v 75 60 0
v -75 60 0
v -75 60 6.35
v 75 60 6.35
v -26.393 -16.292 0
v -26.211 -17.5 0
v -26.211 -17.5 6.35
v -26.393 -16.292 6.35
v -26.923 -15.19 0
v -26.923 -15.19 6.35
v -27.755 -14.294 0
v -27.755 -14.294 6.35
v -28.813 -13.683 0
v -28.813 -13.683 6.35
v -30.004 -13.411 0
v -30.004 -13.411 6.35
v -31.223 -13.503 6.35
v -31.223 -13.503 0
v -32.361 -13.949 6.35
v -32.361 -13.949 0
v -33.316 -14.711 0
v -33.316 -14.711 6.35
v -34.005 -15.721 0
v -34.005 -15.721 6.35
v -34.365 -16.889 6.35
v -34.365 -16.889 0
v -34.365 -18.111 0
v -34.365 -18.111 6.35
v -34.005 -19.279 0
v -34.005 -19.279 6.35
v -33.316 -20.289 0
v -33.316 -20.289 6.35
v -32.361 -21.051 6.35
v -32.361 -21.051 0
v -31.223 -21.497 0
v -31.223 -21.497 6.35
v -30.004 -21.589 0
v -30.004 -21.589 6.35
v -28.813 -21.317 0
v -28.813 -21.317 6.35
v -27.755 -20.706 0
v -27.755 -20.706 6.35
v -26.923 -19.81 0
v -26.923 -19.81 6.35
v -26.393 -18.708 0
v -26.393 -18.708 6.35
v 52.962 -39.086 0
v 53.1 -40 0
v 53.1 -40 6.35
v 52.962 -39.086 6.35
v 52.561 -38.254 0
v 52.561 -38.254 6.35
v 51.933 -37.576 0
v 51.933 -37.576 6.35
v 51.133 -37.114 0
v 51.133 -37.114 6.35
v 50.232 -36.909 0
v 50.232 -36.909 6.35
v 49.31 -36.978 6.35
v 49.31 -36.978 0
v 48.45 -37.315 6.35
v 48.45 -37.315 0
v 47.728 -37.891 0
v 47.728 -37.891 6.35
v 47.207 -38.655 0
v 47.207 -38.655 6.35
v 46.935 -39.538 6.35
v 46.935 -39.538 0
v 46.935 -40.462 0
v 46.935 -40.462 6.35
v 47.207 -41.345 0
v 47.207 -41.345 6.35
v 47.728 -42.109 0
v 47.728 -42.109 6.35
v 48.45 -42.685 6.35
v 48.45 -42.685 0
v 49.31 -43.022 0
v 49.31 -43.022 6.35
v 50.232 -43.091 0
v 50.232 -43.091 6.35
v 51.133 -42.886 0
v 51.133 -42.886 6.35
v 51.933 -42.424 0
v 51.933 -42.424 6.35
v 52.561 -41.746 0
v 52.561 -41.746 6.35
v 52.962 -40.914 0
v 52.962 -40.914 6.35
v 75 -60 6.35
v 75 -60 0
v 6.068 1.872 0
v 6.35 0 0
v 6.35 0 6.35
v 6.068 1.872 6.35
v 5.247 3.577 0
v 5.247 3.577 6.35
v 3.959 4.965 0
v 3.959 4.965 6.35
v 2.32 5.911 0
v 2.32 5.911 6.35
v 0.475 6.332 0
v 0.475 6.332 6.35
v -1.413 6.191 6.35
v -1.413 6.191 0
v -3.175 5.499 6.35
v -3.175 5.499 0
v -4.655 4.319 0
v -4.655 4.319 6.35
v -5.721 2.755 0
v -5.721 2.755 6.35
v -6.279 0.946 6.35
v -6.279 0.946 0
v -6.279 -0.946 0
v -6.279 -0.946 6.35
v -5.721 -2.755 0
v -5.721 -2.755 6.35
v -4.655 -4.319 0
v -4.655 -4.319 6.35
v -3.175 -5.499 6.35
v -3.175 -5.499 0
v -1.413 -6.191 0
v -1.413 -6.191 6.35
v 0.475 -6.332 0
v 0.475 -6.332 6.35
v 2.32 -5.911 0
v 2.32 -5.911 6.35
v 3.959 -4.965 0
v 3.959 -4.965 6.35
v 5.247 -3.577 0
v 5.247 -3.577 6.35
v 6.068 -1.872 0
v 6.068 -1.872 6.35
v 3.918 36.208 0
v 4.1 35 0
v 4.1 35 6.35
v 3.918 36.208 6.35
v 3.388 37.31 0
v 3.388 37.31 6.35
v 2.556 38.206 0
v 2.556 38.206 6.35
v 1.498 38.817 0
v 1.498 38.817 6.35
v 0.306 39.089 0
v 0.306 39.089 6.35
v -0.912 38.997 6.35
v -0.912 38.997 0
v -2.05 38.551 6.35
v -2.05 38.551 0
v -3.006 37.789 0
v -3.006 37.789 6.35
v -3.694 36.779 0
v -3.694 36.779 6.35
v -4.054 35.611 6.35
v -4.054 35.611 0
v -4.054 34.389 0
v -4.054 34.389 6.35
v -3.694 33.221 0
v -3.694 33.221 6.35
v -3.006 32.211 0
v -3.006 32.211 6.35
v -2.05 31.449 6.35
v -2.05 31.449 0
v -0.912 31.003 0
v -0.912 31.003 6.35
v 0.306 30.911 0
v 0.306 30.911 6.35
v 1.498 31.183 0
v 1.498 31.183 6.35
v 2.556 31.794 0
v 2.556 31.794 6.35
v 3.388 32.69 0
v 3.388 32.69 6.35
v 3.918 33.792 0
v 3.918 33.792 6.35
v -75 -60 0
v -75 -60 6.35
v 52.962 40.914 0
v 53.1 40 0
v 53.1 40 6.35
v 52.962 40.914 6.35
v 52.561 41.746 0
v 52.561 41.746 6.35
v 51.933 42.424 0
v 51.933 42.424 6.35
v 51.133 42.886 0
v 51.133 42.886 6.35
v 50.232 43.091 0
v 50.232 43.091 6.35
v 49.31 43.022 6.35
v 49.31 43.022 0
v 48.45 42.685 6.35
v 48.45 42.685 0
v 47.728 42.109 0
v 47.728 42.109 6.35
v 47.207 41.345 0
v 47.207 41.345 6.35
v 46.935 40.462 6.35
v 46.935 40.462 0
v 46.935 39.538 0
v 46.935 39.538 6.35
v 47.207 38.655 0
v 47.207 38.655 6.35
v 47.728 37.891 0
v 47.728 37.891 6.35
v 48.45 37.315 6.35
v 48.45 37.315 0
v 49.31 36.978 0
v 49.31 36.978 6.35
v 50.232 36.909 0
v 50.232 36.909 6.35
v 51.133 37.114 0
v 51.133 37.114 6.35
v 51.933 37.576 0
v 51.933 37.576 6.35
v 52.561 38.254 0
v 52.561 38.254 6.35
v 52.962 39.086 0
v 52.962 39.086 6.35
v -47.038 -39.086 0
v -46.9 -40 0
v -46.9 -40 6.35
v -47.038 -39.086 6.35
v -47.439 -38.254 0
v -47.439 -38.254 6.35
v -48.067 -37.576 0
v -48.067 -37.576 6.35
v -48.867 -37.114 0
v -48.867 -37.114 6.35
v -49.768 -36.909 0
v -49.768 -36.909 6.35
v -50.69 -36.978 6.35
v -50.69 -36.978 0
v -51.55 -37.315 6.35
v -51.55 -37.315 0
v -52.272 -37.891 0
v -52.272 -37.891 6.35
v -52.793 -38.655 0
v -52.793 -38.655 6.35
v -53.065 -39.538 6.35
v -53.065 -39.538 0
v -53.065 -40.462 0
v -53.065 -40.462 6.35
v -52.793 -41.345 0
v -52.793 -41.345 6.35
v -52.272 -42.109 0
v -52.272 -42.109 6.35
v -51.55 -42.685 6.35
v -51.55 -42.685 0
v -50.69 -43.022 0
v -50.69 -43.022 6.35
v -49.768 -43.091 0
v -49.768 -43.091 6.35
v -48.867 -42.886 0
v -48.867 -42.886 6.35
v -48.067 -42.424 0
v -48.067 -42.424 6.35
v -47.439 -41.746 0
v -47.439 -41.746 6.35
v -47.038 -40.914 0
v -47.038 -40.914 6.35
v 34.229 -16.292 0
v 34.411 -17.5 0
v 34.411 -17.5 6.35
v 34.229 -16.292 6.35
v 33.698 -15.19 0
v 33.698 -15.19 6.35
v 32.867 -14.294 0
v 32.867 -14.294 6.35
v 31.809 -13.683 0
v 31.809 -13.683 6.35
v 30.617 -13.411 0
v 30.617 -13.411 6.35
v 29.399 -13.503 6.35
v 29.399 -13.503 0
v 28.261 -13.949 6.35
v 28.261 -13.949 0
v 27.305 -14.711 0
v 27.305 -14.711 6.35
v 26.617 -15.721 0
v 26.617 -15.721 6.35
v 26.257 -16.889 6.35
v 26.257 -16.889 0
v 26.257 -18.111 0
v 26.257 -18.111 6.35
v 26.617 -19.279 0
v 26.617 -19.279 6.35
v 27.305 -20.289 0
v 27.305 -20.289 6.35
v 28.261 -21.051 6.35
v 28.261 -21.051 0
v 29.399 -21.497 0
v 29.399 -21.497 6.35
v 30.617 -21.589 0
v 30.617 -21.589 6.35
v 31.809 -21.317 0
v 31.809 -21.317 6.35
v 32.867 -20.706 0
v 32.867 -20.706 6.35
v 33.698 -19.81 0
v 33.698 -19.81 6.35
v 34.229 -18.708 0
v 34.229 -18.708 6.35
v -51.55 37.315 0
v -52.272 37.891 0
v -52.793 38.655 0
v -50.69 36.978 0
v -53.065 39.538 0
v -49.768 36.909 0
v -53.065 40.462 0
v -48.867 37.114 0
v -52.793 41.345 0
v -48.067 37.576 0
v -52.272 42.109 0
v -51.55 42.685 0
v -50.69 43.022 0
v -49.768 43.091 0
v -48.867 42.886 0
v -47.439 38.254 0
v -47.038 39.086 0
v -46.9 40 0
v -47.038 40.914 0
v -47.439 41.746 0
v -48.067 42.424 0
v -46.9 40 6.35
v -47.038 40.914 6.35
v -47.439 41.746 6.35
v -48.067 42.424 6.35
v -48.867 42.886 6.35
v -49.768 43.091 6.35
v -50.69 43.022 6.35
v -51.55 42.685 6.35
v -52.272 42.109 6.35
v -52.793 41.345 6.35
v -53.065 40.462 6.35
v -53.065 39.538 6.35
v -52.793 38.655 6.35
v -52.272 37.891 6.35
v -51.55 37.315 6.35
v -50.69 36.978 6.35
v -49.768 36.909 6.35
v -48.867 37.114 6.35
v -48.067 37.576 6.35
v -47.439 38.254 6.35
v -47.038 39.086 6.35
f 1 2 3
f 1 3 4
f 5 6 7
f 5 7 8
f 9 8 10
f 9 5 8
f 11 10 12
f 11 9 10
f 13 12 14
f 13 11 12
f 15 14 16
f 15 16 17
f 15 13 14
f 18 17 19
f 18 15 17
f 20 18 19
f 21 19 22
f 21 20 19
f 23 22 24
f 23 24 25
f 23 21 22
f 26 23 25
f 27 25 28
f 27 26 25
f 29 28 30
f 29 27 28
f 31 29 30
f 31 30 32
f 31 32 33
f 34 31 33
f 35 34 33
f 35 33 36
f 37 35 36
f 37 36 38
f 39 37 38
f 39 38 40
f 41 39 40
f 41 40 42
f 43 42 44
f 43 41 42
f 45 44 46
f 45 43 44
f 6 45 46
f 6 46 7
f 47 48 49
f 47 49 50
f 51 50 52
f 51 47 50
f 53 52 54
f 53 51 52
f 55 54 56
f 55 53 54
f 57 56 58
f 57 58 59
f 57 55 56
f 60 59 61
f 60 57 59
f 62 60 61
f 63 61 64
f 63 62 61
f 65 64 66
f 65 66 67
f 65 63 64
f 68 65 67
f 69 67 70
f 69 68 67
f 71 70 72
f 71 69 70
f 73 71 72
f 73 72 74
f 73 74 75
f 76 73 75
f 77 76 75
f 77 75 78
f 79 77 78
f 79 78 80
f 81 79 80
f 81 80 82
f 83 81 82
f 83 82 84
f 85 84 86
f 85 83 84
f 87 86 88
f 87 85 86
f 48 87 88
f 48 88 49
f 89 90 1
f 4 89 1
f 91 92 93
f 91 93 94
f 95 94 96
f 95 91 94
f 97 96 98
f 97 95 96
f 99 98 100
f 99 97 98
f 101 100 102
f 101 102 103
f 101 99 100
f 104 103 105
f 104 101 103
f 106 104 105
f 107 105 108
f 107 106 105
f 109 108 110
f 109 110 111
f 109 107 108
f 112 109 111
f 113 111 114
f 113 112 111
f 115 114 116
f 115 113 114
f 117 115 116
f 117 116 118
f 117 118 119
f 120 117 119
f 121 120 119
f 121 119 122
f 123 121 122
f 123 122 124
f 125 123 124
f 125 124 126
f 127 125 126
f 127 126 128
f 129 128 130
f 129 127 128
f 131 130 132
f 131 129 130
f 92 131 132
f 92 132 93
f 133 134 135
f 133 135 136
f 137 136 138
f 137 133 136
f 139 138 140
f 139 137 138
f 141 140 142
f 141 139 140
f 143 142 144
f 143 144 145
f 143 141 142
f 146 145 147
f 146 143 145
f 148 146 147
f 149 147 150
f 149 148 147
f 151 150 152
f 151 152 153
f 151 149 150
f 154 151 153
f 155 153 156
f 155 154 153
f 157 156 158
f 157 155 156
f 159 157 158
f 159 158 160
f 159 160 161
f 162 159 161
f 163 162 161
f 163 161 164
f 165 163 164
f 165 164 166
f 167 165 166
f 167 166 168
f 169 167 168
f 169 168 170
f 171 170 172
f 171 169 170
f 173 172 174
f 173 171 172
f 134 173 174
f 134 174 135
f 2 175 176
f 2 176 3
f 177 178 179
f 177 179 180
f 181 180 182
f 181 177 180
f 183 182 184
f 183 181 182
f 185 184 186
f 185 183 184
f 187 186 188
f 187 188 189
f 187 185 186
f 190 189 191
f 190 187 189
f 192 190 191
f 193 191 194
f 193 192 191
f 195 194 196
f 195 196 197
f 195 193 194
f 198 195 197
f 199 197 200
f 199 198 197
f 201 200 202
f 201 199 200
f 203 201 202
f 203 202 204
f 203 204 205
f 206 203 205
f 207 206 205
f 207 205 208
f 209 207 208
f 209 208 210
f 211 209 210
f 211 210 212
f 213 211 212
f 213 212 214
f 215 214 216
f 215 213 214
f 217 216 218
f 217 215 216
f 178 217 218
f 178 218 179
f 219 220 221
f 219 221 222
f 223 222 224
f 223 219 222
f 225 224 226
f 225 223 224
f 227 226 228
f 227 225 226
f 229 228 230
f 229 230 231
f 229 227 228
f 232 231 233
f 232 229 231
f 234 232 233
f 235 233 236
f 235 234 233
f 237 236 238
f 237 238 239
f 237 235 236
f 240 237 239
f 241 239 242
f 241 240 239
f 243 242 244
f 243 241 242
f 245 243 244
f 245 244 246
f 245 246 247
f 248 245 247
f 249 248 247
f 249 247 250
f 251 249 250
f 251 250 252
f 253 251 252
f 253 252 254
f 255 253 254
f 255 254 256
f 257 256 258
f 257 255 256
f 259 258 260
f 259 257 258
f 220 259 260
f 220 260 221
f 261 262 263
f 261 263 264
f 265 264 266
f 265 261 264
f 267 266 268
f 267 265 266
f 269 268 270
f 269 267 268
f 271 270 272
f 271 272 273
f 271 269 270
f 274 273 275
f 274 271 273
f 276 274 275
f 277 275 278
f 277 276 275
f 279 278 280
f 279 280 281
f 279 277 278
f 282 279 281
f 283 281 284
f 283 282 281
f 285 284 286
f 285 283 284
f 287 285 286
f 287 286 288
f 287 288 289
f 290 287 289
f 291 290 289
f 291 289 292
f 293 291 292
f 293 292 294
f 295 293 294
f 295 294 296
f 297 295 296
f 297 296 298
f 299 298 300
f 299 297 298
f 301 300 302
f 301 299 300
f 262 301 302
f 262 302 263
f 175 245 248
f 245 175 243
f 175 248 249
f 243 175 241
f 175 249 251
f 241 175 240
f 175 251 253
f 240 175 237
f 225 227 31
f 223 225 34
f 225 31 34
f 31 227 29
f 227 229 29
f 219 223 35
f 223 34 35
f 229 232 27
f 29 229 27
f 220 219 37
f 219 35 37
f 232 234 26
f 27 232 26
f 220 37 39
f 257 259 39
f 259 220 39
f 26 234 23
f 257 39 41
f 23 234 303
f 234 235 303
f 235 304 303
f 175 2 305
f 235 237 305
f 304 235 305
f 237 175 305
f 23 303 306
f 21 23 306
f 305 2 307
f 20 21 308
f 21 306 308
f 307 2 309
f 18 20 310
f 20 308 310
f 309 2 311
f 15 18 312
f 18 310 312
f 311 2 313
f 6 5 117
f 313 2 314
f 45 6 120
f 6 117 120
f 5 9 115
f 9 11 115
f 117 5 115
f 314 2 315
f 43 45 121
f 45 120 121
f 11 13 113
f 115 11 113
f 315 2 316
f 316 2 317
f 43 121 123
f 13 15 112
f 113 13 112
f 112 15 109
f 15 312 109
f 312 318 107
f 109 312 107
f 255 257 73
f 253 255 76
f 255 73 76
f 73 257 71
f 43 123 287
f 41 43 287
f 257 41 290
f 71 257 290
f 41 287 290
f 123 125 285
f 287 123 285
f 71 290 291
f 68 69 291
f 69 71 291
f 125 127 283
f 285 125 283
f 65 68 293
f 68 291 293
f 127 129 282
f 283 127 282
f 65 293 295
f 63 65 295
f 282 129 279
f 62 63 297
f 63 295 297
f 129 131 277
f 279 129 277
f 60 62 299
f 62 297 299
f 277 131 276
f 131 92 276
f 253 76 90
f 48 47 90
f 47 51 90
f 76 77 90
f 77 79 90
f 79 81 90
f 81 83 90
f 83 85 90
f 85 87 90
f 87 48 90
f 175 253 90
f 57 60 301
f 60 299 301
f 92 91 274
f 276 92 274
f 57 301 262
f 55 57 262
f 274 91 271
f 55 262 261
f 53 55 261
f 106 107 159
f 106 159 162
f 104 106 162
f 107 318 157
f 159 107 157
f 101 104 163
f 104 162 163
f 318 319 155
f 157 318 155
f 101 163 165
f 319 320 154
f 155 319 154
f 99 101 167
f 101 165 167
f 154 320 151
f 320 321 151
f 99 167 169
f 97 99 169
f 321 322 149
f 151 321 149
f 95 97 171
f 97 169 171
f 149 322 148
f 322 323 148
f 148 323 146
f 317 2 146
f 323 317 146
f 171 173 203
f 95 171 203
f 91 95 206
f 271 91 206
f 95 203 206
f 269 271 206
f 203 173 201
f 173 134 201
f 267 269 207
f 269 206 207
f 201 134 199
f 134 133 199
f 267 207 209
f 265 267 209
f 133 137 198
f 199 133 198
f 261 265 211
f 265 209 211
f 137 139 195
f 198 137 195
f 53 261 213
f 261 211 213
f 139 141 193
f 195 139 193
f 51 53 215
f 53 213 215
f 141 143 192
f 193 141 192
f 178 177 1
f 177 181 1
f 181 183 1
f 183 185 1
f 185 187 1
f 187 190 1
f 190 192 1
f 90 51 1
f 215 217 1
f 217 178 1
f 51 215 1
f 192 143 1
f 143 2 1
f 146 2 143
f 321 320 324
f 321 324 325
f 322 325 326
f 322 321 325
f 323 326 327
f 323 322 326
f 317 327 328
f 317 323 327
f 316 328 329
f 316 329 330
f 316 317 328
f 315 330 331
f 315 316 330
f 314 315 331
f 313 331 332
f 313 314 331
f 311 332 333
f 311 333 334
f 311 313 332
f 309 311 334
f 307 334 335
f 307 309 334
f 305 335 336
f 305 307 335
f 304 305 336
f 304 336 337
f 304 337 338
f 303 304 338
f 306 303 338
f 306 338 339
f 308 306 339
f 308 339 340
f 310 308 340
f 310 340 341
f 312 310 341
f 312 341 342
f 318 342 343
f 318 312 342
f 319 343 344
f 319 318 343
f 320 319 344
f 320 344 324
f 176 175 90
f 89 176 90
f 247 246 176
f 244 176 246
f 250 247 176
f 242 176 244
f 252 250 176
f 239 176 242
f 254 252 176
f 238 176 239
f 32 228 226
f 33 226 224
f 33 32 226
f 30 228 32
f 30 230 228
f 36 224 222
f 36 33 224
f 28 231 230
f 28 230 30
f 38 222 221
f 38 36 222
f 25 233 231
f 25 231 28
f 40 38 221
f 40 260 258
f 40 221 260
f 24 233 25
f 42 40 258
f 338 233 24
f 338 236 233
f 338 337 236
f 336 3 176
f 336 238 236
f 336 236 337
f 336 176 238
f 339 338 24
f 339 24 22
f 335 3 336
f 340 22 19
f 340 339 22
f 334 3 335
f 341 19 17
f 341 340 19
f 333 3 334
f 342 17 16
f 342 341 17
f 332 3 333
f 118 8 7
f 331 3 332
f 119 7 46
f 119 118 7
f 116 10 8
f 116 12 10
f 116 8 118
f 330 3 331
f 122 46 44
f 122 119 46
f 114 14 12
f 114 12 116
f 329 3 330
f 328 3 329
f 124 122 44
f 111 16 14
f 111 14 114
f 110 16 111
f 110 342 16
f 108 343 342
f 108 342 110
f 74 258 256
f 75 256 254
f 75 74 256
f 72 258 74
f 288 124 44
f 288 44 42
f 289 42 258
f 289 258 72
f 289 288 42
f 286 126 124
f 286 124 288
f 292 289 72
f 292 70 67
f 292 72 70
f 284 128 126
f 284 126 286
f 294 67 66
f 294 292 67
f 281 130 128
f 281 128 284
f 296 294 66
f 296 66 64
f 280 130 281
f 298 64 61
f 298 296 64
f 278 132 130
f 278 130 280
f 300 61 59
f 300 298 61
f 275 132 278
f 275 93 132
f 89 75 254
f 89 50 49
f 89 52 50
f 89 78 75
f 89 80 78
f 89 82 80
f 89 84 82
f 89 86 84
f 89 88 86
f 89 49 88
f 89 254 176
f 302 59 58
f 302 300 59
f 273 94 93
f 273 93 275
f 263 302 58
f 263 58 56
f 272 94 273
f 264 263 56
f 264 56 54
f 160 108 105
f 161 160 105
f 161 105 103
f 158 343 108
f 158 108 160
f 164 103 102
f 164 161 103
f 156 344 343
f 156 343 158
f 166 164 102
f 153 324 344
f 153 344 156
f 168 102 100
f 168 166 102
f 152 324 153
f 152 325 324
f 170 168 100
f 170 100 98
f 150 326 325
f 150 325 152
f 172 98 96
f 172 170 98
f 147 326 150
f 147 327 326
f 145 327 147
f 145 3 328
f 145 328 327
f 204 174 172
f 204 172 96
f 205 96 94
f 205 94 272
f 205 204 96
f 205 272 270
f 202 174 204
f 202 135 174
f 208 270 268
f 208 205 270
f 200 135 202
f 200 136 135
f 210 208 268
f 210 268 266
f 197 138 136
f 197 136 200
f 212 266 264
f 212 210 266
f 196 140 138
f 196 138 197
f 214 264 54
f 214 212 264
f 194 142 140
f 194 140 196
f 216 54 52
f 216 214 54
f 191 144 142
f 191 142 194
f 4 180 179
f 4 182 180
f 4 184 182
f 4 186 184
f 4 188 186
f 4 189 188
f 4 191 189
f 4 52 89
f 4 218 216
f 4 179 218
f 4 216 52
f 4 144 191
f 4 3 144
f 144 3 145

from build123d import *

# Parameters (mm, degrees)
CROQUIS1_W              = 150
CROQUIS1_H              = 120
CROQUIS1_R              = 4.1
CROQUIS1_R_2            = 3.1
CROQUIS1_R_3            = 6.35
SALIENTE_EXTRUIR1_DEPTH = 6.35


with BuildPart() as part:
    # Croquis1 → Saliente-Extruir1 (new body)
    with BuildSketch(Plane.XY):
        Rectangle(CROQUIS1_W, CROQUIS1_H)
        with Locations((0, 35)):
            Circle(CROQUIS1_R, mode=Mode.SUBTRACT)
        with Locations((-50, -40)):
            Circle(CROQUIS1_R_2, mode=Mode.SUBTRACT)
        with Locations((30.310889132, -17.5)):
            Circle(CROQUIS1_R, mode=Mode.SUBTRACT)
        with Locations((-30.310889132, -17.5)):
            Circle(CROQUIS1_R, mode=Mode.SUBTRACT)
        with Locations((50, -40)):
            Circle(CROQUIS1_R_2, mode=Mode.SUBTRACT)
        with Locations((50, 40)):
            Circle(CROQUIS1_R_2, mode=Mode.SUBTRACT)
        with Locations((-50, 40)):
            Circle(CROQUIS1_R_2, mode=Mode.SUBTRACT)
        Circle(CROQUIS1_R_3, mode=Mode.SUBTRACT)
    extrude(amount=SALIENTE_EXTRUIR1_DEPTH)


solid = part.part
